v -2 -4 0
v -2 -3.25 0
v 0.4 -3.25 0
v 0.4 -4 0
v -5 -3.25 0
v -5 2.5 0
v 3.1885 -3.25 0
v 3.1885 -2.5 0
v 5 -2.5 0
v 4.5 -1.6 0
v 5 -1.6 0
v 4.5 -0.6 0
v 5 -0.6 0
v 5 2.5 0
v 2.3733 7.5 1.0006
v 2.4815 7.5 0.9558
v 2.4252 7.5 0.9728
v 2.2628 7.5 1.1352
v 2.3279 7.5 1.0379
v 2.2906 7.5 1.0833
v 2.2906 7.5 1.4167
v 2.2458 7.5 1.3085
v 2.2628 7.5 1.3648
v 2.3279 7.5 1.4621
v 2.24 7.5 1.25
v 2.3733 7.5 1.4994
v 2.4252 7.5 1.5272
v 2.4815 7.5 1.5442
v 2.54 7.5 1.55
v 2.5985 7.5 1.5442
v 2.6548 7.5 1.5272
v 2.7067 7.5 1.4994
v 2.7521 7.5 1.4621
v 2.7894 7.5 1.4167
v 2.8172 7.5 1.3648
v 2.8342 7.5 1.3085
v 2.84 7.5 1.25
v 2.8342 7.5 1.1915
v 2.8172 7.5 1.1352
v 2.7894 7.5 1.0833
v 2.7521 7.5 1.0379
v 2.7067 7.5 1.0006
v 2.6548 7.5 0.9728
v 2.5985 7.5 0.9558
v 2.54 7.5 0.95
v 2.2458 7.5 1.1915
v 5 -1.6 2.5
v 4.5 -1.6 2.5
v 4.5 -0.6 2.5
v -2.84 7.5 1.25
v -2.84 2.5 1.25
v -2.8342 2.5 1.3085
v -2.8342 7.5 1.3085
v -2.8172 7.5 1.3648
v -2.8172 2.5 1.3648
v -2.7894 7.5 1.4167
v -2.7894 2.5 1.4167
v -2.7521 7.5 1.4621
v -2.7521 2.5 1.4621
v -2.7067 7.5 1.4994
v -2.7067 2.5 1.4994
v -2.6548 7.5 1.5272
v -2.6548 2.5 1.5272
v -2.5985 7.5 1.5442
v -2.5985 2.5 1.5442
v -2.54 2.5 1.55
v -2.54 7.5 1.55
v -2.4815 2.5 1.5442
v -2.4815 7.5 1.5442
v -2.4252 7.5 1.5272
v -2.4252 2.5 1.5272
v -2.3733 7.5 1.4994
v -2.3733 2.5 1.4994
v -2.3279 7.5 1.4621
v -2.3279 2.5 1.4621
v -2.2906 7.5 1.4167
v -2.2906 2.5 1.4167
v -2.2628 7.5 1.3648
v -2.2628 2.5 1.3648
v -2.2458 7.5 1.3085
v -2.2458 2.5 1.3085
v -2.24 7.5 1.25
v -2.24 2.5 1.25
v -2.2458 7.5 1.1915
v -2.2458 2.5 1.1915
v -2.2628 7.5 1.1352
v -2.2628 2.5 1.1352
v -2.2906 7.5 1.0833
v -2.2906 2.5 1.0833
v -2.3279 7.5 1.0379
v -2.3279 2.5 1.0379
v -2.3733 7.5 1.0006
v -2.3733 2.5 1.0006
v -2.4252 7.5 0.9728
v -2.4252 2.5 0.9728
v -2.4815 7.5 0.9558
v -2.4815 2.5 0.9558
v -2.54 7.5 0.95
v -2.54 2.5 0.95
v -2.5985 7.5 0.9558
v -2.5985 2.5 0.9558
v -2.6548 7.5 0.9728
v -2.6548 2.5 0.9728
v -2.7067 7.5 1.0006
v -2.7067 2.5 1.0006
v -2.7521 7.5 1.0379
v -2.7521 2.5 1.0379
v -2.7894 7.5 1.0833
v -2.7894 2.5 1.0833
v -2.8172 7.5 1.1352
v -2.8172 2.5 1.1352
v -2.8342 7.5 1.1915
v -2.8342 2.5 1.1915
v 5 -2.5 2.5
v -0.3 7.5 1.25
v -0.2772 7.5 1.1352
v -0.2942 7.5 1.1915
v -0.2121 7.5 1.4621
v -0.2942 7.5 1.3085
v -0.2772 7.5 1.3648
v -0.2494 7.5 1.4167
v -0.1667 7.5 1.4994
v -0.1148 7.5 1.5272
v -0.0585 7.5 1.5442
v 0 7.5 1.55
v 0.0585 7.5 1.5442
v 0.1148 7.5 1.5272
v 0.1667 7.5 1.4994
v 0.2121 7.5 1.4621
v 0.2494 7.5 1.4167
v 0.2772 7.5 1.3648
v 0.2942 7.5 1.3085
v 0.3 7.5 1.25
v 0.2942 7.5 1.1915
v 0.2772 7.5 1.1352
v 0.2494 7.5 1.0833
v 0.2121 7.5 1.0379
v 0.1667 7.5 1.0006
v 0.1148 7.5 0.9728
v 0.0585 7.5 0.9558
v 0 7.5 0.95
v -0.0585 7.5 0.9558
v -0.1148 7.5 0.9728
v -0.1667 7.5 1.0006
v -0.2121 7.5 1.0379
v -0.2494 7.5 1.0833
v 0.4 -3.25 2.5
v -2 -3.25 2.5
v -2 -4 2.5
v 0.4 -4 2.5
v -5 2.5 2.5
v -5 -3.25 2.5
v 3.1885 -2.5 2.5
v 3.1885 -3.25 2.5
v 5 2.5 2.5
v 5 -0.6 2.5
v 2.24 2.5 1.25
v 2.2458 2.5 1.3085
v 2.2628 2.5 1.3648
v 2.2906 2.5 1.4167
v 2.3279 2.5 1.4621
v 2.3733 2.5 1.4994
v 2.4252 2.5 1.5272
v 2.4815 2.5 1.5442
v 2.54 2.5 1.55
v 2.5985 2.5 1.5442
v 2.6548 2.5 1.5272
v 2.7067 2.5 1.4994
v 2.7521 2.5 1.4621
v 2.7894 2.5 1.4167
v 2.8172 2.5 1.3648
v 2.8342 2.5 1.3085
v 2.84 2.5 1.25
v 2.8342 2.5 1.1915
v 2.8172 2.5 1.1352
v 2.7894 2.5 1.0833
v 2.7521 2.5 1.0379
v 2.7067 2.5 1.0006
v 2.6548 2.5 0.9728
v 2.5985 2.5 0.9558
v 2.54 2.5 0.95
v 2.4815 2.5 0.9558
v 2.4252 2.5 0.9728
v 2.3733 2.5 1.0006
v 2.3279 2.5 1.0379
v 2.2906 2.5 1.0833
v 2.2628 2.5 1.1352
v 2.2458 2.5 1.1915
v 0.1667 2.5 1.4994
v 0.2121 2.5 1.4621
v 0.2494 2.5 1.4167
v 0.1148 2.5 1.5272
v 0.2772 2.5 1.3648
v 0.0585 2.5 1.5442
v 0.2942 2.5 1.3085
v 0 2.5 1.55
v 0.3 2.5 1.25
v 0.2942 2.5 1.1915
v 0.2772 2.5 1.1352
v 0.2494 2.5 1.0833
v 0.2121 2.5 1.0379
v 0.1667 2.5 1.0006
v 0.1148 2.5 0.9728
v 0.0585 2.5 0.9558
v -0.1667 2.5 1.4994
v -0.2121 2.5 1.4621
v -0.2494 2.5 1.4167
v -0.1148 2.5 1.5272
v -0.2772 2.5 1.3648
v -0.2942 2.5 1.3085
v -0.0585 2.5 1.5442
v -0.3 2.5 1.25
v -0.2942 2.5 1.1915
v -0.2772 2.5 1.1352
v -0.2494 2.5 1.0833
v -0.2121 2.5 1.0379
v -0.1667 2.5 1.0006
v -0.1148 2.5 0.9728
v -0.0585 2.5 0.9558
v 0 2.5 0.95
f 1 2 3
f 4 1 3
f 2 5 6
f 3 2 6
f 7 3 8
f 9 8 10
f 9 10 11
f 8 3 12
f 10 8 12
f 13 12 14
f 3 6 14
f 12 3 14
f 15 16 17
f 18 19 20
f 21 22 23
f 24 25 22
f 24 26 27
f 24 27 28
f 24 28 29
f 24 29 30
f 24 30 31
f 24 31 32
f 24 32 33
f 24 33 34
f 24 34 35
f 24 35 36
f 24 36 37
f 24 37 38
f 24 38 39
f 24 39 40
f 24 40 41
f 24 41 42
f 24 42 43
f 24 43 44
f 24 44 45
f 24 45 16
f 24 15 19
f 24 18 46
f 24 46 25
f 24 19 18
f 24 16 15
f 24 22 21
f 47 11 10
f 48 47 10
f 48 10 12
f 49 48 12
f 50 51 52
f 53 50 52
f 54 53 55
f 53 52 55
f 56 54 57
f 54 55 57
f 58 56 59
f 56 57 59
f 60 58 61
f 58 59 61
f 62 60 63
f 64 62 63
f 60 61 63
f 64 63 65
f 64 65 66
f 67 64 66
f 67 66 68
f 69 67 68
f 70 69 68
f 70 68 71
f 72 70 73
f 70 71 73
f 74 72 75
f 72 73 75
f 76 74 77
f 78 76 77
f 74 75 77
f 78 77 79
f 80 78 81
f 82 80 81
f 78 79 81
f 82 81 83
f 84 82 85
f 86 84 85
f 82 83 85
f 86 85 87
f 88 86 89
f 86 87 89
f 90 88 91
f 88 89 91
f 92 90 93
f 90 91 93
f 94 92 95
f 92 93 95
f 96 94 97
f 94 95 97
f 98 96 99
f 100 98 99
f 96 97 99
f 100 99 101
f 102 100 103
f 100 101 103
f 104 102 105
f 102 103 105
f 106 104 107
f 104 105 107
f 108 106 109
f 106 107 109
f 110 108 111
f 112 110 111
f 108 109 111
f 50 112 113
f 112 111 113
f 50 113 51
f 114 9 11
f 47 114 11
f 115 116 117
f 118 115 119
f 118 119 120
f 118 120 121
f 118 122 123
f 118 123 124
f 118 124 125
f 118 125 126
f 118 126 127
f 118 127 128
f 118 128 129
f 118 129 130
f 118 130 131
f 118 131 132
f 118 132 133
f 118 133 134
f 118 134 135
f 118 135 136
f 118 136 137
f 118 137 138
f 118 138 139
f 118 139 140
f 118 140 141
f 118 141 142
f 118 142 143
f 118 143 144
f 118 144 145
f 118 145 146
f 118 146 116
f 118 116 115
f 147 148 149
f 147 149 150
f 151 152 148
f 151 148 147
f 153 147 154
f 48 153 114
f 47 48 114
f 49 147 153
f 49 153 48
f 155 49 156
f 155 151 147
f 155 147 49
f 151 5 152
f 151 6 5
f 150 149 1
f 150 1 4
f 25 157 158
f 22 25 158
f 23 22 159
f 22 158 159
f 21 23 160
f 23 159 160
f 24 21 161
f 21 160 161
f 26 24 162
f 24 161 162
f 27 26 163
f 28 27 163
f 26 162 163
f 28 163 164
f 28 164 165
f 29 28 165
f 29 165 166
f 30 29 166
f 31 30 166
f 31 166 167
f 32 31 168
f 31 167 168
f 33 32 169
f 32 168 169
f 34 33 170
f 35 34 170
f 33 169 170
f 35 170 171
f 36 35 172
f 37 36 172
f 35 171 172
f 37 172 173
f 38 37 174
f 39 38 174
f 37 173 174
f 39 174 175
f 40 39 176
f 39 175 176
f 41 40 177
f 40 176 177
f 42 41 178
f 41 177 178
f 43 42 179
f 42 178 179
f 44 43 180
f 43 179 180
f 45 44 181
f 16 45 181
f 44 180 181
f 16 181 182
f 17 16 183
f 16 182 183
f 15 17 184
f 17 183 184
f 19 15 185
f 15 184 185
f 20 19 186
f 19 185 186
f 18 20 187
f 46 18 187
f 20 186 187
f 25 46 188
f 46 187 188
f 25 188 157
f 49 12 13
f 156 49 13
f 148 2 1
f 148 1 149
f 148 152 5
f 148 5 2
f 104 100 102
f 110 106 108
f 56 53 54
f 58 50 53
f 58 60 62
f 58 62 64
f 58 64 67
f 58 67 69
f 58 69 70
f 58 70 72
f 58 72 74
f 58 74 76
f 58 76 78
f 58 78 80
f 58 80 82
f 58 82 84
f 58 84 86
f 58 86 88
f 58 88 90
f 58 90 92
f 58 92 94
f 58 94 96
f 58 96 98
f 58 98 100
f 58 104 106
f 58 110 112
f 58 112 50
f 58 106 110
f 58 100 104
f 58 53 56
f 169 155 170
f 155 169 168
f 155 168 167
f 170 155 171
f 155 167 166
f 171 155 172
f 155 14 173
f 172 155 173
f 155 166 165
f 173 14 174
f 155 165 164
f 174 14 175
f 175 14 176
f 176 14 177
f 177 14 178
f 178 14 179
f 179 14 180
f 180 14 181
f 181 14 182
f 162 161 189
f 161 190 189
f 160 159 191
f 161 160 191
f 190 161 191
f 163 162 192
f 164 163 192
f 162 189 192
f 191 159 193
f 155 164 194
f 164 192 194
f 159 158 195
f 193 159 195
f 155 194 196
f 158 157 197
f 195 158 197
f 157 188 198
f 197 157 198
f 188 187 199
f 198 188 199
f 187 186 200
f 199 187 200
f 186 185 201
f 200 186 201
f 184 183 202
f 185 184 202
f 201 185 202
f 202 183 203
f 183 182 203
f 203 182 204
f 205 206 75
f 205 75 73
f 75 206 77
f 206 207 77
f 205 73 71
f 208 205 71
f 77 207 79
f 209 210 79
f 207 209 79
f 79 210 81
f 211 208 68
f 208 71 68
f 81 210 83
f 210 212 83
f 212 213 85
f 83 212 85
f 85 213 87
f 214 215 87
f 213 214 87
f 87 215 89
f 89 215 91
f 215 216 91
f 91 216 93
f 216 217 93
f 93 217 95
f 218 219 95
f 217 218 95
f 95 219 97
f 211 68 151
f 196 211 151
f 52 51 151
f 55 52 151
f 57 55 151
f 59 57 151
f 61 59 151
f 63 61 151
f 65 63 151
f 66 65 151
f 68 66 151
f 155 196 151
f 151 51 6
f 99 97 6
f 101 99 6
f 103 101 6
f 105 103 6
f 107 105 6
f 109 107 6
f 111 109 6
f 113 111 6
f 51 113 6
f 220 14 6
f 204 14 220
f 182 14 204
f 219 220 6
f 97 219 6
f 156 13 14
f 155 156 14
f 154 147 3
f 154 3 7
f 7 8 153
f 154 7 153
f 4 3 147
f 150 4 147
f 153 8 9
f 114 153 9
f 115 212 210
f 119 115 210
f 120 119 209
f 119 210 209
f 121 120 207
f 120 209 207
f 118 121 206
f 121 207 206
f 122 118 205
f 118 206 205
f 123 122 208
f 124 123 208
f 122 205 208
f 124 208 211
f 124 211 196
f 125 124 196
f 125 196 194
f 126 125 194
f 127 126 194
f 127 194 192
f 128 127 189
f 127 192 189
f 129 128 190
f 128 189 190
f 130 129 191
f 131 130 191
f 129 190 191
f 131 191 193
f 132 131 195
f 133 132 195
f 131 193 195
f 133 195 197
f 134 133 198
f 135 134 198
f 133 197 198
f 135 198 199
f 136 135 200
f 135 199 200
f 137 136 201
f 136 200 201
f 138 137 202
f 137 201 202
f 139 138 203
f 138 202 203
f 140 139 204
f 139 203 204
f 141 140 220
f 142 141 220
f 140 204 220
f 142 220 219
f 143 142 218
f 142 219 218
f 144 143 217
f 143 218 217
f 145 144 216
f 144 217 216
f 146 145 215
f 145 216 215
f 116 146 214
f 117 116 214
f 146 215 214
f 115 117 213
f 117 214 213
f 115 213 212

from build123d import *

# Parameters (mm, degrees)
F1_DEPTH = 2.5
F2_W     = 8.188494
F2_H     = 2.5
F3_DEPTH = 0.75
F4_W     = 1.2
F4_H     = 2.5
F5_DEPTH = 0.75
F6_R     = 0.3
F7_DEPTH = 5


with BuildPart() as f1:
    # F0 (on Top) → F1 (new body)
    with BuildSketch(Plane.XY):
        Polygon((5, -0.6), (5, 2.5), (-5, 2.5), (-5, -2.5), (5, -2.5), (5, -1.6), (4.5, -1.6), (4.5, -0.6), align=None)
    extrude(amount=F1_DEPTH)

    # F2 (on face) → F3 (join)
    with BuildSketch(Plane.XZ.offset(2.5)):
        with Locations((-0.905753, 1.25)):
            Rectangle(F2_W, F2_H)
    extrude(amount=F3_DEPTH)

    # F4 (on face) → F5 (join)
    with BuildSketch(Plane.XZ.offset(3.25)):
        with Locations((-1.4, 1.25)):
            Rectangle(F4_W, F4_H)
        with Locations((-0.2, 1.25)):
            Rectangle(F4_W, F4_H)
    extrude(amount=F5_DEPTH)

    # F6 (on face) → F7 (join)
    with BuildSketch(Plane(origin=(0, 2.5, 0), x_dir=(-1, 0, 0), z_dir=(0, 1, 0))):
        with Locations((2.54, 1.25)):
            Circle(F6_R)
        with Locations((0, 1.25)):
            Circle(F6_R)
        with Locations((-2.54, 1.25)):
            Circle(F6_R)
    extrude(amount=F7_DEPTH)


solid = f1.part
